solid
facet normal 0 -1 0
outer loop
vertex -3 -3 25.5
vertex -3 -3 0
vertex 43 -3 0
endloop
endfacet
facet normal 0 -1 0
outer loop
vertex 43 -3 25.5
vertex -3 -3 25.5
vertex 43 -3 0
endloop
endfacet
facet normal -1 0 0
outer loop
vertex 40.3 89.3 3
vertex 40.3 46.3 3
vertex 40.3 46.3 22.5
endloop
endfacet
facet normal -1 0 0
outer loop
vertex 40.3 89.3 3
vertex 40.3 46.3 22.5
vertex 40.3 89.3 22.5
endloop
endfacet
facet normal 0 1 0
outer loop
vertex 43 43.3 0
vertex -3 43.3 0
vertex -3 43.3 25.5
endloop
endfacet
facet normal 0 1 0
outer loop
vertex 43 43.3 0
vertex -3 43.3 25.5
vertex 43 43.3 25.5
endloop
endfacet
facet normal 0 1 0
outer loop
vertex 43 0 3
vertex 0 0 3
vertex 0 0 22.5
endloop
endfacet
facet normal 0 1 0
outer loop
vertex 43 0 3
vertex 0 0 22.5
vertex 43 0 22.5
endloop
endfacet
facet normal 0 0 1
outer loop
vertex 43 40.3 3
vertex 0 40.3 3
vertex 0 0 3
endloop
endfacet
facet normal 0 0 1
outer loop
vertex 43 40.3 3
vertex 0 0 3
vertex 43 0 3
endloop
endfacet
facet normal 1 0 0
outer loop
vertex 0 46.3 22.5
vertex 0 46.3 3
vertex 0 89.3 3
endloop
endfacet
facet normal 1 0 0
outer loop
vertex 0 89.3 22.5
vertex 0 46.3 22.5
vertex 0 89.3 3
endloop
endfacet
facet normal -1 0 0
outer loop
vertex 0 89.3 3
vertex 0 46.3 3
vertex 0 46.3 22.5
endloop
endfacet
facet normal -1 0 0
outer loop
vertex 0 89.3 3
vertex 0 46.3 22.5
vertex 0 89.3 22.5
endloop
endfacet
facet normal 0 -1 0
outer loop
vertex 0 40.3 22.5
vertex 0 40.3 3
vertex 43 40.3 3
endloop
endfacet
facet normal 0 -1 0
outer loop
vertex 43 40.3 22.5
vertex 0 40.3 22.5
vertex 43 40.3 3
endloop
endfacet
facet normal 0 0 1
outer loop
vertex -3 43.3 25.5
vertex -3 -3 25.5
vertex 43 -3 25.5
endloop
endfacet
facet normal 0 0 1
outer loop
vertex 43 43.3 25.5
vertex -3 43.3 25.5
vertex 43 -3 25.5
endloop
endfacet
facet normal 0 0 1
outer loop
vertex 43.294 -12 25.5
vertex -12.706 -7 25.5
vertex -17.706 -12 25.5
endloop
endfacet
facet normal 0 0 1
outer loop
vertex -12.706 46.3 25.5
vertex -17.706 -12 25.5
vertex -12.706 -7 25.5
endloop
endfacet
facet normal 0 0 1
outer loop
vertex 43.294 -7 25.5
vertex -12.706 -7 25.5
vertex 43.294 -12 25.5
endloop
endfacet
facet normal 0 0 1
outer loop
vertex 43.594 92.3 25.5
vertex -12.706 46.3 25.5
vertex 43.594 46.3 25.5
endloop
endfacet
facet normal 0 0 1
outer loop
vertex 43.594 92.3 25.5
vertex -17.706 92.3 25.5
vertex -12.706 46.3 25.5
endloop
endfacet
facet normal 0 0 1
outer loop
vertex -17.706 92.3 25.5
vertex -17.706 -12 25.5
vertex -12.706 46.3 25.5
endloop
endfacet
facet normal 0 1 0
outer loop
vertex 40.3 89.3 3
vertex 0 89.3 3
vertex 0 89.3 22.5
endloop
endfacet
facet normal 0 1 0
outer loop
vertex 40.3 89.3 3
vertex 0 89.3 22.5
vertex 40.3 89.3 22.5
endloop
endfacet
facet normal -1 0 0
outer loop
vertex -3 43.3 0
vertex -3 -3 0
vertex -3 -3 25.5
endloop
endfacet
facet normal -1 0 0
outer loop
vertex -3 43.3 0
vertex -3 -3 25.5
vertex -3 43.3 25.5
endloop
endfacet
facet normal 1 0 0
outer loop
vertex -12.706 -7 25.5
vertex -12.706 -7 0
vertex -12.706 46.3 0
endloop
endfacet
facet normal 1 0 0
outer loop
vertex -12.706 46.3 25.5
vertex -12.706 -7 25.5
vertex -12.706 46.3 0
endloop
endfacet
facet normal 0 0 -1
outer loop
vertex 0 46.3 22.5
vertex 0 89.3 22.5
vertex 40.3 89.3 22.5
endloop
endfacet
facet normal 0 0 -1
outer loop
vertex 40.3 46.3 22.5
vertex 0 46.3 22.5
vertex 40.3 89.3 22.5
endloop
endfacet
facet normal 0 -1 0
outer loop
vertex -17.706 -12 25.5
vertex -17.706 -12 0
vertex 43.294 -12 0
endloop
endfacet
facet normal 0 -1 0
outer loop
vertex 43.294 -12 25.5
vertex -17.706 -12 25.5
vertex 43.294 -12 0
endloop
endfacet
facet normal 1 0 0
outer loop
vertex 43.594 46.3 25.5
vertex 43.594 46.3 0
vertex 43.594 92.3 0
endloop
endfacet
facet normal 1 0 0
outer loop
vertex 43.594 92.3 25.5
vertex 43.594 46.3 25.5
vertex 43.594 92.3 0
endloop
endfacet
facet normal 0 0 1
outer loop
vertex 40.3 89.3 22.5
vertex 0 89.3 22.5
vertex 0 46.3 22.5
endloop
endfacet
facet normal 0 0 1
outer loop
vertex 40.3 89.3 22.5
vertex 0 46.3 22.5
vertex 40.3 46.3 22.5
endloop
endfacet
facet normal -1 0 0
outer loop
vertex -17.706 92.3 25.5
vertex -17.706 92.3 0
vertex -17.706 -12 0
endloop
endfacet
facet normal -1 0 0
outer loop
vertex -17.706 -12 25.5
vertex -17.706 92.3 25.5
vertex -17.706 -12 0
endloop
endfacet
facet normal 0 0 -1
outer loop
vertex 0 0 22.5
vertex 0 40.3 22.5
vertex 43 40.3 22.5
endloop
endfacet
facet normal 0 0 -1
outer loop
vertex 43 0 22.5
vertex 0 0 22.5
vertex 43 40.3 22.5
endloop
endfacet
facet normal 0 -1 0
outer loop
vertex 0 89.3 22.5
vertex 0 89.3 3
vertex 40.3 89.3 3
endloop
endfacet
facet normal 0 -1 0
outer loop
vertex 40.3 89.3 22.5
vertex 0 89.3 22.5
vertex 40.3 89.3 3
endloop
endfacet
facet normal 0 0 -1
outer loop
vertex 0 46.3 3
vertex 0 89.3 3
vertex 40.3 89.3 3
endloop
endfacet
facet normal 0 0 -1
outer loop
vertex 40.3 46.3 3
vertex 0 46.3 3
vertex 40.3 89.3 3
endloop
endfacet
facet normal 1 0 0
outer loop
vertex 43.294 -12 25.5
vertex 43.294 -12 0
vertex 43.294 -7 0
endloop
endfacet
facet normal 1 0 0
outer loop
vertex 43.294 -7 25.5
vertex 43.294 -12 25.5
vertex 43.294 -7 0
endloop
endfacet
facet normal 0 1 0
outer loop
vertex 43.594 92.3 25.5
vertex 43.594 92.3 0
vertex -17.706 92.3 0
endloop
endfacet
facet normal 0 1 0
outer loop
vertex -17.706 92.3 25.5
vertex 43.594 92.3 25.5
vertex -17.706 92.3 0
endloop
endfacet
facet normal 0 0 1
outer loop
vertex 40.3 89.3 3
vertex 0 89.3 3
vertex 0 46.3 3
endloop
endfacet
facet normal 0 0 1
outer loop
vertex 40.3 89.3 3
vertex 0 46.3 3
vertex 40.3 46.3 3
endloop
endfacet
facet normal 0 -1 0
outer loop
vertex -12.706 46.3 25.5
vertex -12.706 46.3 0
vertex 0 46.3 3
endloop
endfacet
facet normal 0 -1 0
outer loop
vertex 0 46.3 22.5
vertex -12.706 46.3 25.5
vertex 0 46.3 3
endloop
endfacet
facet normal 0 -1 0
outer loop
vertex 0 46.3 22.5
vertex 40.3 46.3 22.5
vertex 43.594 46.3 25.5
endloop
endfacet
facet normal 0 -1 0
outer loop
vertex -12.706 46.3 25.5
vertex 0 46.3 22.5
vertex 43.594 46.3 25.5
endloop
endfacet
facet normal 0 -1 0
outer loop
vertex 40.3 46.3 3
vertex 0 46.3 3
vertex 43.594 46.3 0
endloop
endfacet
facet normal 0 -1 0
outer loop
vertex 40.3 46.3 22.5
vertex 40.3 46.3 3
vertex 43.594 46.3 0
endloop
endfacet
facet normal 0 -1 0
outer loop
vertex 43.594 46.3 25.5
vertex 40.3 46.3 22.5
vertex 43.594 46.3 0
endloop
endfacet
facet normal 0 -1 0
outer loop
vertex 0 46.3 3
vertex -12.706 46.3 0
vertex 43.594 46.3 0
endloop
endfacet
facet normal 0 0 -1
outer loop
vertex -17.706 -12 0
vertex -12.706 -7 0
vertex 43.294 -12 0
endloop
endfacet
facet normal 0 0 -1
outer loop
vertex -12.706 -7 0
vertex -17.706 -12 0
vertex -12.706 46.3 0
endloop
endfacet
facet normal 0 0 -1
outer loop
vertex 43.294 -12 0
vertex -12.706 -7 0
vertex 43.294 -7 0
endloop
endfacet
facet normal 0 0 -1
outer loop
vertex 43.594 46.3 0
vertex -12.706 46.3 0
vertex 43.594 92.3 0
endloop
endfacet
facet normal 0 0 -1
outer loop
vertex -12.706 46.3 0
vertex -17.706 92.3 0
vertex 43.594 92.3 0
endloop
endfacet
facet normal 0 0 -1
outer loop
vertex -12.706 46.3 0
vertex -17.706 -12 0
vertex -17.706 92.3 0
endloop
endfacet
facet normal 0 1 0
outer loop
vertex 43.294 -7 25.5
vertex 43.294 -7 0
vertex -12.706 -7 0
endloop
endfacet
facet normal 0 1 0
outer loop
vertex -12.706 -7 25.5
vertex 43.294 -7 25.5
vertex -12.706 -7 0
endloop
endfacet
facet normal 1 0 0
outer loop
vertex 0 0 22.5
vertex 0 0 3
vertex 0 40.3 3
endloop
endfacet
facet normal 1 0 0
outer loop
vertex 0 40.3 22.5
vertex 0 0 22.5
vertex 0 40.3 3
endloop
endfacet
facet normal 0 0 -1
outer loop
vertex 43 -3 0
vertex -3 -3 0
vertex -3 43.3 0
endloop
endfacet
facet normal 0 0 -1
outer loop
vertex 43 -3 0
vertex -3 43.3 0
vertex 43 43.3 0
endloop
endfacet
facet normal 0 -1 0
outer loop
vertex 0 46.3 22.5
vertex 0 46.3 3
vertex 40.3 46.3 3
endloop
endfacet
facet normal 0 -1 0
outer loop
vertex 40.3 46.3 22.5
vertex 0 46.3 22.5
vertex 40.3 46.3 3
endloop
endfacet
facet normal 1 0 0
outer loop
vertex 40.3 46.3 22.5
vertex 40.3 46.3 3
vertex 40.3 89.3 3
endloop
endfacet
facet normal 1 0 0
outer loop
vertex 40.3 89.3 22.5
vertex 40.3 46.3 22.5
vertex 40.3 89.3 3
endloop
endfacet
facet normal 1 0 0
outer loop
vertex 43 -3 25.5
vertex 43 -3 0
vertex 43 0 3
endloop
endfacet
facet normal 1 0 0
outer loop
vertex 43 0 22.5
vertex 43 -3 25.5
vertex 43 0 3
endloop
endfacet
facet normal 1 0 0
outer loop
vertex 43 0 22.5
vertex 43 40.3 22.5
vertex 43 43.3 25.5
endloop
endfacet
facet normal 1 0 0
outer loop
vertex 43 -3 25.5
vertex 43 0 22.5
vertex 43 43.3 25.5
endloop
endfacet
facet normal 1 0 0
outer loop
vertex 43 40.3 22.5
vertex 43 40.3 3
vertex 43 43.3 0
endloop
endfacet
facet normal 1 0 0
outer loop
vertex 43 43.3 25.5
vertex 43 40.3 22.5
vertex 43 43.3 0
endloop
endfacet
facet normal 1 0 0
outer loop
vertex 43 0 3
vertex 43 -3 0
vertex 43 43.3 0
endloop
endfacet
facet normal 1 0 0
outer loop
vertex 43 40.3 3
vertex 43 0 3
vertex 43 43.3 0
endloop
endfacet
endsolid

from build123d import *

# Parameters (mm, degrees)
SKETCH001_W     = 46
SKETCH001_H     = 46.3
PAD_DEPTH       = 25.5
SKETCH_W        = 43
SKETCH_H        = 40.3
POCKET_DEPTH    = 19.5
SKETCH002_W     = 40.3
SKETCH002_H     = 43
PAD001_DEPTH    = 19.5
PAD002_DEPTH    = 25.5
SKETCH004_W     = 40.3
SKETCH004_H     = 43
POCKET001_DEPTH = 19.5


with BuildPart() as femurbody:
    # Sketch001 → Pad (new body)
    with BuildSketch(Plane.XY):
        with Locations((20, 20.15)):
            Rectangle(SKETCH001_W, SKETCH001_H)
    extrude(amount=PAD_DEPTH)

    # Sketch → Pocket (cut)
    with BuildSketch(Plane.XY.offset(3)):
        with Locations((21.5, 20.15)):
            Rectangle(SKETCH_W, SKETCH_H)
    extrude(amount=POCKET_DEPTH, mode=Mode.SUBTRACT)


with BuildPart() as hipservobody:
    # Sketch002 → Pad001 (new body)
    with BuildSketch(Plane.XY):
        with Locations((20.15, 67.8)):
            Rectangle(SKETCH002_W, SKETCH002_H)
    extrude(amount=PAD001_DEPTH)


with BuildPart() as hipservobody_1:
    # Body001 placement: moved
    add(hipservobody.part.moved(Location((0, 0, 3))))


with BuildPart() as body002:
    # Sketch003 → Pad002 (new body)
    with BuildSketch(Plane.XY):
        Polygon((43.593663, 46.3), (43.593663, 92.3), (-17.706337, 92.3), (-17.706337, -12), (43.293663, -12), (43.293663, -7), (-12.706337, -7), (-12.706337, 46.3), align=None)
    extrude(amount=PAD002_DEPTH)

    # Sketch004 → Pocket001 (cut)
    with BuildSketch(Plane.XY.offset(3)):
        with Locations((20.15, 67.8)):
            Rectangle(SKETCH004_W, SKETCH004_H)
    extrude(amount=POCKET001_DEPTH, mode=Mode.SUBTRACT)


solid = Compound([femurbody.part, hipservobody_1.part, body002.part])
